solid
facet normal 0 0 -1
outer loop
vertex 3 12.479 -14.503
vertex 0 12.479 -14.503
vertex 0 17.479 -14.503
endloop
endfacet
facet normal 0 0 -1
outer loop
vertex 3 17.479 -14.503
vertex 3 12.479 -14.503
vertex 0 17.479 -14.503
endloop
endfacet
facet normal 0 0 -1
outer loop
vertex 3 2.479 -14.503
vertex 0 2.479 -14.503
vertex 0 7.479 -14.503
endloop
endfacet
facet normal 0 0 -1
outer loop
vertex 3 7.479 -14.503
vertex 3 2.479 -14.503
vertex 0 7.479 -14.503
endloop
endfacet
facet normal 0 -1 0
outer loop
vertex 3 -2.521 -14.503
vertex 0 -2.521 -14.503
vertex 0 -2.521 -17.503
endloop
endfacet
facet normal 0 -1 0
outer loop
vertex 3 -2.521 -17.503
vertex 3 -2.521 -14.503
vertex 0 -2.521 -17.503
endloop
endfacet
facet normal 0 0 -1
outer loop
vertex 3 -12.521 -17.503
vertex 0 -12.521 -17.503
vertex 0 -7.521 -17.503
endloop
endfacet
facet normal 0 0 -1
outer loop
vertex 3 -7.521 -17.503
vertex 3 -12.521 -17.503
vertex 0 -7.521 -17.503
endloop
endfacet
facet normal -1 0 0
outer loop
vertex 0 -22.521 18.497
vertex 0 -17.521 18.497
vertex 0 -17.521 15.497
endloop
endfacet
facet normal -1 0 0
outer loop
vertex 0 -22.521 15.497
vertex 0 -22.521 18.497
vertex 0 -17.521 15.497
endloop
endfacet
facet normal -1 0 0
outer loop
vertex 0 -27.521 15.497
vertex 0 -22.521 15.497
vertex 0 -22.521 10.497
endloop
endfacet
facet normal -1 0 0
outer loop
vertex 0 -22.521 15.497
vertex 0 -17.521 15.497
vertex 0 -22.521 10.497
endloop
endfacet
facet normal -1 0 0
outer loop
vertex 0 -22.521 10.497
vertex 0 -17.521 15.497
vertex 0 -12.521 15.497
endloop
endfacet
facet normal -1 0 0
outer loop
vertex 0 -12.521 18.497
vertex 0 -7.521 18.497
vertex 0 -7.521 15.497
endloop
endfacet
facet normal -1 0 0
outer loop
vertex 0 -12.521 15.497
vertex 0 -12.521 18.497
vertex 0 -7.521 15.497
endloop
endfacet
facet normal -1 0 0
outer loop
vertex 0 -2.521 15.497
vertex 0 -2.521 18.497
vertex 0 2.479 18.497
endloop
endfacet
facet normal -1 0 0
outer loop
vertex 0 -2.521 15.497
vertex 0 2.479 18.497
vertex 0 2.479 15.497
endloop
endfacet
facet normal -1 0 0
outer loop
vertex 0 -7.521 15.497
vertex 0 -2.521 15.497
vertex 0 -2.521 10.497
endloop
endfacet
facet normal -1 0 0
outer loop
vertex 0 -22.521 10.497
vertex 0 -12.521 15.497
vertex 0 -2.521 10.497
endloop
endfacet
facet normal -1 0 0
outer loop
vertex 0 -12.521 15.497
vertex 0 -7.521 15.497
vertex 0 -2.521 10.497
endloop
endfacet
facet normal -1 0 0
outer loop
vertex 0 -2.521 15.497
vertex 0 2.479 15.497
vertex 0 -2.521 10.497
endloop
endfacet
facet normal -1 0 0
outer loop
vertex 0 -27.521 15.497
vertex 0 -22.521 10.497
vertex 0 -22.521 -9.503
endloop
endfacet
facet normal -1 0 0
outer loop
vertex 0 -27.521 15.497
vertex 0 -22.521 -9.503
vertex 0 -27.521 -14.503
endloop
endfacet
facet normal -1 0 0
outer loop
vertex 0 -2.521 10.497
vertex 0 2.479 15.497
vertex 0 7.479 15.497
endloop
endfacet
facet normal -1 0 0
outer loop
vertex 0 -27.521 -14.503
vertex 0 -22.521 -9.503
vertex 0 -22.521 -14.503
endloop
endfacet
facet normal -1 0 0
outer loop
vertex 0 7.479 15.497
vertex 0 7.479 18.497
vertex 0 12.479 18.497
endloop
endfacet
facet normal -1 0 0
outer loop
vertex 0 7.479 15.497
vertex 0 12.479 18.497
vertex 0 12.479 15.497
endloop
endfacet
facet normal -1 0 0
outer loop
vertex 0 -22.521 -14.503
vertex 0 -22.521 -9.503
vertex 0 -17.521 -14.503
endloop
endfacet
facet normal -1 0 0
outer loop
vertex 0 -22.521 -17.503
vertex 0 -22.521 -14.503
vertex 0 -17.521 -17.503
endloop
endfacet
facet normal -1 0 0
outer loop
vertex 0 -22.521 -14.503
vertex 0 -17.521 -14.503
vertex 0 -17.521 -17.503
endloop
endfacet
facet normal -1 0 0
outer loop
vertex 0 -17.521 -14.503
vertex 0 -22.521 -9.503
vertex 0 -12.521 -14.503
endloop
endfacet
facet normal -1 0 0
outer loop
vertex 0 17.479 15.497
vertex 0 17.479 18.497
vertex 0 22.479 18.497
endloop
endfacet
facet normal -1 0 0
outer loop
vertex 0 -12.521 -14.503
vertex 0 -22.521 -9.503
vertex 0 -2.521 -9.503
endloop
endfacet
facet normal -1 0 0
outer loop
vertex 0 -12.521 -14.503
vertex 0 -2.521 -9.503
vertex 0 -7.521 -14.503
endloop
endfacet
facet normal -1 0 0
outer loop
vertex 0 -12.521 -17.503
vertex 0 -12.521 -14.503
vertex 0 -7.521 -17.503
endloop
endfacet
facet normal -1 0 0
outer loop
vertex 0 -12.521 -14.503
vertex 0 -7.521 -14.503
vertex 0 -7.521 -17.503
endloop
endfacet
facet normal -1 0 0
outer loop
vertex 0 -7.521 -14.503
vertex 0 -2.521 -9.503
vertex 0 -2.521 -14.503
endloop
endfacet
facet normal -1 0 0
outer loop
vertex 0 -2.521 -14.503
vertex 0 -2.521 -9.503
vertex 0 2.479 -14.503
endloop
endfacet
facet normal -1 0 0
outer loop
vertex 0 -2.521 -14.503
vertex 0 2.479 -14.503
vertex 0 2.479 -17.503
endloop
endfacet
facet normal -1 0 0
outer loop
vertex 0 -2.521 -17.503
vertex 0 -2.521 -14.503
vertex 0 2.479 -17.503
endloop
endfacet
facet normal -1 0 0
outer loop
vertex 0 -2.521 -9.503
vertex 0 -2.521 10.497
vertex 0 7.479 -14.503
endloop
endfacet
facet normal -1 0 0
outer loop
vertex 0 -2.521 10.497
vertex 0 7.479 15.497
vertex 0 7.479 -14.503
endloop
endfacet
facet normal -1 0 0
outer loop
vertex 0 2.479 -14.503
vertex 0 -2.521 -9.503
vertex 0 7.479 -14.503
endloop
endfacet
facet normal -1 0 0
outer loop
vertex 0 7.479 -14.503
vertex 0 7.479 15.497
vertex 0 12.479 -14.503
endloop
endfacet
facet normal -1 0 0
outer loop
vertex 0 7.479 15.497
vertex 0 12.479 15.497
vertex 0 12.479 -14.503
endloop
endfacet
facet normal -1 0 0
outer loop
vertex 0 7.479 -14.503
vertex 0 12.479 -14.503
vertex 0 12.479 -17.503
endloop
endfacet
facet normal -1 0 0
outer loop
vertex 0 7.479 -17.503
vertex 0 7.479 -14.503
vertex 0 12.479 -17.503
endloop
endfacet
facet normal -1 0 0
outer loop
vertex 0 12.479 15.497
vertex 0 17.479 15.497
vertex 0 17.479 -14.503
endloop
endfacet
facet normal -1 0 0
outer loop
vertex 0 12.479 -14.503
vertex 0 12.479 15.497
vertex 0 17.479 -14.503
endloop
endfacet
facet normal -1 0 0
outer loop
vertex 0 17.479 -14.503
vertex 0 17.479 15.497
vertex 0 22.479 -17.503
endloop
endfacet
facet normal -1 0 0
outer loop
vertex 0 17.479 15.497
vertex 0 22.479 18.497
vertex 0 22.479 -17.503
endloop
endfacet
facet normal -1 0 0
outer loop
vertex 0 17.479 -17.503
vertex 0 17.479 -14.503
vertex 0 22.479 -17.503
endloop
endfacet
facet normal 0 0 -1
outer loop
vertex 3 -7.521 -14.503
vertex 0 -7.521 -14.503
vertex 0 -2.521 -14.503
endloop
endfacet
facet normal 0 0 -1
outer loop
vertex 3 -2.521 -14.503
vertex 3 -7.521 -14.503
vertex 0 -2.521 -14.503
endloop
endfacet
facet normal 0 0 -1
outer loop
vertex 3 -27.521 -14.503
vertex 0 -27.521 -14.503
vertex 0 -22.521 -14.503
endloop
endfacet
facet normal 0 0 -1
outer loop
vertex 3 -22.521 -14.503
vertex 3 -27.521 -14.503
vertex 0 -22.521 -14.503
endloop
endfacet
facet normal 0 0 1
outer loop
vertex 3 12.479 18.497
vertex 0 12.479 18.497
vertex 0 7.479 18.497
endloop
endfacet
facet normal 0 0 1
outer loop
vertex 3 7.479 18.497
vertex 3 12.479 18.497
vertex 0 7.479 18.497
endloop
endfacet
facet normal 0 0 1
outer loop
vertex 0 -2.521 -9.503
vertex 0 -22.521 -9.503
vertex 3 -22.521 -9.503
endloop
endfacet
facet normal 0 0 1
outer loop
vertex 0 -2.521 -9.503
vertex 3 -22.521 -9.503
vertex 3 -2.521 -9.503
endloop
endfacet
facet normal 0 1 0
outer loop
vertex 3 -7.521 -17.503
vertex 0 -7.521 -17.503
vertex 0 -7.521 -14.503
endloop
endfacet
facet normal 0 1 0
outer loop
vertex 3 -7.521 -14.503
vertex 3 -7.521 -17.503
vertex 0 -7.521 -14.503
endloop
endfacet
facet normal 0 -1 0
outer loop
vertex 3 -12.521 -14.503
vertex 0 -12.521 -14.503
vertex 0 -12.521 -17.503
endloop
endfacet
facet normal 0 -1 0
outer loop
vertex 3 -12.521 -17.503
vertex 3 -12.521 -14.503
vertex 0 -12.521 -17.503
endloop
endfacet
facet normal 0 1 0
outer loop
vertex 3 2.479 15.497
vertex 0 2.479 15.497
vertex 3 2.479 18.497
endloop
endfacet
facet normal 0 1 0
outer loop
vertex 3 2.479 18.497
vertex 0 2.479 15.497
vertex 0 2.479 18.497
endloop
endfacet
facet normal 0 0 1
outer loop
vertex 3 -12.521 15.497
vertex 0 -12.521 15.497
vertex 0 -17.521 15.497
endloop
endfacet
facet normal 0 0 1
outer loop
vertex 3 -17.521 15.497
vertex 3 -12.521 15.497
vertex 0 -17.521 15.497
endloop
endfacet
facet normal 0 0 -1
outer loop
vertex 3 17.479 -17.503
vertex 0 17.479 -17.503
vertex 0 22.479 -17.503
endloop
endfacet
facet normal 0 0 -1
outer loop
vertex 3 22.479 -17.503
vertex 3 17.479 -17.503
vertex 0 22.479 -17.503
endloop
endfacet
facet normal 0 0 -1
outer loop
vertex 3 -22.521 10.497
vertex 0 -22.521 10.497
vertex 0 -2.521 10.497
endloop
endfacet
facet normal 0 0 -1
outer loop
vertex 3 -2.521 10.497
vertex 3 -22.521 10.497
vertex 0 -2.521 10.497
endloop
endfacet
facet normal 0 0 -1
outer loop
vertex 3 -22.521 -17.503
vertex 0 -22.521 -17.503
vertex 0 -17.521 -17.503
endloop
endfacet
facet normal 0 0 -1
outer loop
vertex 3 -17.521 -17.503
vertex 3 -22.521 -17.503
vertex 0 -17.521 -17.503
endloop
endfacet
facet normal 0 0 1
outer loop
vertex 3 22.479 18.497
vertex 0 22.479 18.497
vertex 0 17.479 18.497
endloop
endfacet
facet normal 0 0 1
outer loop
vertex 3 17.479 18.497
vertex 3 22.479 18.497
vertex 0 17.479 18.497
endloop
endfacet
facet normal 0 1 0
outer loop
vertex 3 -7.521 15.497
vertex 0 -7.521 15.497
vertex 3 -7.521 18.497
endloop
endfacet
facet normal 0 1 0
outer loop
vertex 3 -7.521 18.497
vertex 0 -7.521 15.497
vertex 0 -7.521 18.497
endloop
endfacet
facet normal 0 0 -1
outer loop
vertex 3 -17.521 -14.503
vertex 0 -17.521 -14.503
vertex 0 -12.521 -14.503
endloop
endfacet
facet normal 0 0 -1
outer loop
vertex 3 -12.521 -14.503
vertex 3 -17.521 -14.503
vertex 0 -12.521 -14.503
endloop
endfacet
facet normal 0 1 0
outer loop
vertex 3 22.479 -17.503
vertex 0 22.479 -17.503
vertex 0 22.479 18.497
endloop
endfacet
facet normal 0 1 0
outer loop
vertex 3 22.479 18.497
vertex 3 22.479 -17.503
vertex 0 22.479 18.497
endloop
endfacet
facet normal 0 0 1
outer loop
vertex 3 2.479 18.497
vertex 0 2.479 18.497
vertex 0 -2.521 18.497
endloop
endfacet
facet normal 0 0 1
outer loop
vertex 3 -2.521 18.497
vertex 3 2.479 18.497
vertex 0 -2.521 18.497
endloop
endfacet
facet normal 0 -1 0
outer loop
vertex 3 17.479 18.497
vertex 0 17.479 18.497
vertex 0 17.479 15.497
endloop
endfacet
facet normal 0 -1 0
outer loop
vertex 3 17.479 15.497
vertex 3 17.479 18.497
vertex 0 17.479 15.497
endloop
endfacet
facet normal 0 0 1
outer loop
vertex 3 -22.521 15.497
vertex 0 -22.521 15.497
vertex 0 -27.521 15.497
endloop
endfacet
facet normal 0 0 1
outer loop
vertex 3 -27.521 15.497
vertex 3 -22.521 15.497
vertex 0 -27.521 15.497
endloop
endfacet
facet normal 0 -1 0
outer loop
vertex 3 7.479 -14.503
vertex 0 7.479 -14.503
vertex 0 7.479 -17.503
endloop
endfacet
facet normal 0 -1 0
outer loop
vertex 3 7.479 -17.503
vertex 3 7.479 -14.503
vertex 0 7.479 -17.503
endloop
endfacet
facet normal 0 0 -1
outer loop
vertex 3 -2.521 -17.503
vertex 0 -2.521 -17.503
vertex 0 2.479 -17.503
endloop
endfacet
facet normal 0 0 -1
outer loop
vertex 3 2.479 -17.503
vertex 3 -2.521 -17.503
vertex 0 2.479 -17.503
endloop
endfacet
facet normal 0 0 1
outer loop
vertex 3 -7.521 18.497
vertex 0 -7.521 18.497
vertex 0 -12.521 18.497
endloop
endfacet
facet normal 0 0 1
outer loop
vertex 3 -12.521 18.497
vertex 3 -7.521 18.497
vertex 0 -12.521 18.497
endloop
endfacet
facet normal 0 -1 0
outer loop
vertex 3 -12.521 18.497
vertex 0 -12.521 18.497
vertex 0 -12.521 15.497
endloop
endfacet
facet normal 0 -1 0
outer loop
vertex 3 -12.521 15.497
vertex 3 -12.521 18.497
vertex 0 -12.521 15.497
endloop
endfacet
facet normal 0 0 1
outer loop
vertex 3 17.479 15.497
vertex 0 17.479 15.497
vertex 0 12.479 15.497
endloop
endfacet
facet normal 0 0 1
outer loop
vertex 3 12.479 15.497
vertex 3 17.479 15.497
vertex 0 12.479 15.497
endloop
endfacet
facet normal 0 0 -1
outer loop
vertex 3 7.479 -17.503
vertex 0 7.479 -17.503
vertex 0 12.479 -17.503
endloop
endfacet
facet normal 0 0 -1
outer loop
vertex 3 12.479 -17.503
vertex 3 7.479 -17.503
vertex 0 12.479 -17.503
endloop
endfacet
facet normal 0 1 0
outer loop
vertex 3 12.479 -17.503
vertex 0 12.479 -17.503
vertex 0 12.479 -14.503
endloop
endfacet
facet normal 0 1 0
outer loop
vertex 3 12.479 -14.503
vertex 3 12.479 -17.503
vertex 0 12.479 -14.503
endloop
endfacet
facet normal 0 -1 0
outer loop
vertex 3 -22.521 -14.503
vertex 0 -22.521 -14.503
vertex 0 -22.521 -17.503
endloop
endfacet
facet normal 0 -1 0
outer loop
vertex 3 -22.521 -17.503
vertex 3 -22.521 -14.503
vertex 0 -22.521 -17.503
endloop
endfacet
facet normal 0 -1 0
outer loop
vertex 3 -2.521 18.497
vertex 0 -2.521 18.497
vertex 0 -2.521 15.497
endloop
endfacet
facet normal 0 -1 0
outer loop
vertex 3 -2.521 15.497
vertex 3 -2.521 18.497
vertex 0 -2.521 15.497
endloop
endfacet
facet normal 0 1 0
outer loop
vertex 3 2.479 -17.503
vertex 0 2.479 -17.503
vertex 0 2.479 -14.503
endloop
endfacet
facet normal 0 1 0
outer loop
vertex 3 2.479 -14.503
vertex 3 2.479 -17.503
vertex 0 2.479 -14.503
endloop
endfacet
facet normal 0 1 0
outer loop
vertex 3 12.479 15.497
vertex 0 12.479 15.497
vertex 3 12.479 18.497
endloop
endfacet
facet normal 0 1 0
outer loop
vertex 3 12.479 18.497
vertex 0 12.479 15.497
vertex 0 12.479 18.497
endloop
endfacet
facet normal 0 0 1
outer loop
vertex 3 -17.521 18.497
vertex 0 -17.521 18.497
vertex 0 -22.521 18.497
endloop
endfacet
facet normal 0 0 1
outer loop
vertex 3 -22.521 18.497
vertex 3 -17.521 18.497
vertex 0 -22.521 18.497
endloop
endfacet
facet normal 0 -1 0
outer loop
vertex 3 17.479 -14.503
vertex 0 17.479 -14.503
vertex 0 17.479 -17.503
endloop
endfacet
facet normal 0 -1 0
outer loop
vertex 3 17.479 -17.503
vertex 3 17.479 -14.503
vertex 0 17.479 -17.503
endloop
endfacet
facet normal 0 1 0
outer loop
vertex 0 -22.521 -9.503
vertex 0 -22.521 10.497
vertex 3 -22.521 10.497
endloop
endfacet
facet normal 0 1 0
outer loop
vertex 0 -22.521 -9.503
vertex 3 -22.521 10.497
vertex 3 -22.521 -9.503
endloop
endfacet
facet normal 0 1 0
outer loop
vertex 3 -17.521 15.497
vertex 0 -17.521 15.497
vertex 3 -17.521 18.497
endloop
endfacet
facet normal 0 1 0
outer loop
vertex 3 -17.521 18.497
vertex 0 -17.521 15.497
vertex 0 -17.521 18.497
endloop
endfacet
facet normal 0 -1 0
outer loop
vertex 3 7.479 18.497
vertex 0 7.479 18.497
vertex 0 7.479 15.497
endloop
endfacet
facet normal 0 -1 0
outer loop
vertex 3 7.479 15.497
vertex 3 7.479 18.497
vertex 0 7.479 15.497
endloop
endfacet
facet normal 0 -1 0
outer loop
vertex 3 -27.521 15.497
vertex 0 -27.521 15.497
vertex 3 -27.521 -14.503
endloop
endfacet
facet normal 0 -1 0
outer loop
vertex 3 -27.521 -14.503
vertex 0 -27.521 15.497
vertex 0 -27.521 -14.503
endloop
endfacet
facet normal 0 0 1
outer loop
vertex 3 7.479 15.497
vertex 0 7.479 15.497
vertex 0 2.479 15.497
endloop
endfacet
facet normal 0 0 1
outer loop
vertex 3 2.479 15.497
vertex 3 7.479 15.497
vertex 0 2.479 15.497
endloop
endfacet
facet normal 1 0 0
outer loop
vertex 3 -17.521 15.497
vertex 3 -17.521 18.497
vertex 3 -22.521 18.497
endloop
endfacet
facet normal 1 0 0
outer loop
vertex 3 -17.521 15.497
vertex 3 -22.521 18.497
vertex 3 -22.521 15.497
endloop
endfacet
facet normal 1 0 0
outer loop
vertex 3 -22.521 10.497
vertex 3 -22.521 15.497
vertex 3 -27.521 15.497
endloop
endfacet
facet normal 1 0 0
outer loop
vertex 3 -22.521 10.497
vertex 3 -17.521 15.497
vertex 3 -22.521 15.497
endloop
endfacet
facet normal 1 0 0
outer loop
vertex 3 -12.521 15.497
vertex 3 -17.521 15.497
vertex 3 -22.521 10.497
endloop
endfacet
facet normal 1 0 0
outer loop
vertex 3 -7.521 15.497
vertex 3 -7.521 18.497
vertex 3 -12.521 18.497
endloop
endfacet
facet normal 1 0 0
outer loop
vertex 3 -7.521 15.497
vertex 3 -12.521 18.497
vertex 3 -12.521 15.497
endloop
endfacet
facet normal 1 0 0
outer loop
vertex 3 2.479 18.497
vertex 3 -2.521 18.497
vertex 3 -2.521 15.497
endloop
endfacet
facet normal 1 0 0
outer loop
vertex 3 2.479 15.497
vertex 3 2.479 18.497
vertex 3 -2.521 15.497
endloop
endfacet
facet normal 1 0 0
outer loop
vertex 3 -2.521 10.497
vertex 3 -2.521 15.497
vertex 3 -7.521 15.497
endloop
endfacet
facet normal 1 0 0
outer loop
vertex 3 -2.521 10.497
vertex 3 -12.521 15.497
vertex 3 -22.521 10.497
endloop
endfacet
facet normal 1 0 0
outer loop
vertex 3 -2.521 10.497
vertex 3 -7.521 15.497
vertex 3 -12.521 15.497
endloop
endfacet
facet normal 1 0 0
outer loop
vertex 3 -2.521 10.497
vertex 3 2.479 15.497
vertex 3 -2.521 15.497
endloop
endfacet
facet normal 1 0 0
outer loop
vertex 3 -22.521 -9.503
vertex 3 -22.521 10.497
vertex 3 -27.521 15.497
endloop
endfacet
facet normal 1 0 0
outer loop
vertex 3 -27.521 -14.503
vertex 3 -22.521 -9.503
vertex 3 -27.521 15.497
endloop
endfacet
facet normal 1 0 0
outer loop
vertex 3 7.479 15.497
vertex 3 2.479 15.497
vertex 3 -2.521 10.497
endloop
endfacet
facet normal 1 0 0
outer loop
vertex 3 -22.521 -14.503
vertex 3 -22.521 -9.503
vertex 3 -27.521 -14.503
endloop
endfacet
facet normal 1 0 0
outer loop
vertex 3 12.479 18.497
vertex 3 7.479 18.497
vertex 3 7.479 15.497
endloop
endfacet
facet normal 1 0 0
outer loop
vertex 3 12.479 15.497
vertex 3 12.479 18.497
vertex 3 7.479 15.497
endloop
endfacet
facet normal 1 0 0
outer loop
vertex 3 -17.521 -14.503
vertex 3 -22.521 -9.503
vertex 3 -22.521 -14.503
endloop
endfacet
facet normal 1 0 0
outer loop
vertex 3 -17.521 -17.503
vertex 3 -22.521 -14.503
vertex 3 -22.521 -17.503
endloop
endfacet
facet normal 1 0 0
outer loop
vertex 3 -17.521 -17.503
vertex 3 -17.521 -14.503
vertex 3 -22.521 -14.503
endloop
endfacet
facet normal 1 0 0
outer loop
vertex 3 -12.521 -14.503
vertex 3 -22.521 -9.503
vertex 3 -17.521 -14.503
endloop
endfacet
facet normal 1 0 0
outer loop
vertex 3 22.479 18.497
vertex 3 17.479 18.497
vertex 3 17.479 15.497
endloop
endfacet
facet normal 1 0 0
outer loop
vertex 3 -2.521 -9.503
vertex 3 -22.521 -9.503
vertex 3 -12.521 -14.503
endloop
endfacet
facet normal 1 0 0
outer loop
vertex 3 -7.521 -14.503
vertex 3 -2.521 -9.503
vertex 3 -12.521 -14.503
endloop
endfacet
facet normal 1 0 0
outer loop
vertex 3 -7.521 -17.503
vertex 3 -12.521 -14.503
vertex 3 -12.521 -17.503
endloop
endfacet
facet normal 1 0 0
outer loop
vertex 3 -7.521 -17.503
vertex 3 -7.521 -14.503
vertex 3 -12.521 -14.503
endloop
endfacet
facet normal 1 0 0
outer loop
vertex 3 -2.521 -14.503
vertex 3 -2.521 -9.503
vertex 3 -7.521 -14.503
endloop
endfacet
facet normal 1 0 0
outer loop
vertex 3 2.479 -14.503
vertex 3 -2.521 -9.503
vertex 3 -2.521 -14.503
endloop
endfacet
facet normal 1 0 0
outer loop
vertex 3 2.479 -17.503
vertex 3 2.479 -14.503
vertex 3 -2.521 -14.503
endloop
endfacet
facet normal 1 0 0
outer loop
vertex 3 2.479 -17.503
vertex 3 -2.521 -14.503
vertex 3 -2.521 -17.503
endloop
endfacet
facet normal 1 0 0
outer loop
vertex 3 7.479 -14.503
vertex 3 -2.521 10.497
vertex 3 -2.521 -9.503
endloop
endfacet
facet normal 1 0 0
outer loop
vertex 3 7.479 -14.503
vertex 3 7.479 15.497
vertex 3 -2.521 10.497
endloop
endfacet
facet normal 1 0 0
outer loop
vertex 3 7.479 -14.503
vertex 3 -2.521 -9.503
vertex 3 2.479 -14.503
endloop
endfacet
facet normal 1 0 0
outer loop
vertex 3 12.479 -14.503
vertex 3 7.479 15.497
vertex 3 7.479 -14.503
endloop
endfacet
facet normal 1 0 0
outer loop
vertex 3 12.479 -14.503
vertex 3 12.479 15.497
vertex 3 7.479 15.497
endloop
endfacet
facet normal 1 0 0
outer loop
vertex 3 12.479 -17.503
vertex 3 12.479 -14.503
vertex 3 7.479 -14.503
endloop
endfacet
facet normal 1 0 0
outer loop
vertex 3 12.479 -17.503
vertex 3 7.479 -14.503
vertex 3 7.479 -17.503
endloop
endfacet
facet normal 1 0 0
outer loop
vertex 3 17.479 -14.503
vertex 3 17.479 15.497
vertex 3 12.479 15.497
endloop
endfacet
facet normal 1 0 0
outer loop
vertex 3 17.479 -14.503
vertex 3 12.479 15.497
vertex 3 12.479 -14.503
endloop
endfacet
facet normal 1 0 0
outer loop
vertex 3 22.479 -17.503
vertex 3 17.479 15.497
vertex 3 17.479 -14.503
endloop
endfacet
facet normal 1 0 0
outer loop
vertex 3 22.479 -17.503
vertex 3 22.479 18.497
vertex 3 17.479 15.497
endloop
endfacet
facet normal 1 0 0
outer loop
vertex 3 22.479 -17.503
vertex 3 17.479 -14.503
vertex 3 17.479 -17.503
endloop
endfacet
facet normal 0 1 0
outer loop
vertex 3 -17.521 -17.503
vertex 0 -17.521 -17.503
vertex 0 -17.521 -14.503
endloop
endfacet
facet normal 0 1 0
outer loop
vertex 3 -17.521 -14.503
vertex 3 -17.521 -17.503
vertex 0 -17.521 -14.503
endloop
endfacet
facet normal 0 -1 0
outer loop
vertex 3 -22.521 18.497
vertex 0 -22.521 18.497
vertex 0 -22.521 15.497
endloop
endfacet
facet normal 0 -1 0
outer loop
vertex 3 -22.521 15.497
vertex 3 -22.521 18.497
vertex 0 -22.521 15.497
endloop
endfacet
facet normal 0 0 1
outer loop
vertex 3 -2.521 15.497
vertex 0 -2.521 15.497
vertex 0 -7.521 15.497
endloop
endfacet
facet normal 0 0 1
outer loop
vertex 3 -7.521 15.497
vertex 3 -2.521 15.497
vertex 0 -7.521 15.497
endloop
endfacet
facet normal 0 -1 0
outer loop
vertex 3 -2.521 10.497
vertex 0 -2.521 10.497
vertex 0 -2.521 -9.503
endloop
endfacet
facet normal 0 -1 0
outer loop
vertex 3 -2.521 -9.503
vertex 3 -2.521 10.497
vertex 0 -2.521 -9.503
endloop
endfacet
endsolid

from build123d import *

# Parameters (mm, degrees)
ESBO_O1_W                = 20
ESBO_O1_H                = 20
RESSALTO_EXTRUS_O1_DEPTH = 3


with BuildPart() as part:
    # Esboço1 → Ressalto-extrusão1 (new body)
    with BuildSketch(Plane(origin=(0, 0, 0), x_dir=(0, 0, -1), z_dir=(1, 0, 0))):
        Polygon((-18.496900578, 22.479218088), (-18.496900578, 17.479218088), (-15.496900578, 17.479218088), (-15.496900578, 12.479218088), (-18.496900578, 12.479218088), (-18.496900578, 7.479218088), (-15.496900578, 7.479218088), (-15.496900578, 2.479218088), (-18.496900578, 2.479218088), (-18.496900578, -2.520781912), (-15.496900578, -2.520781912), (-15.496900578, -7.520781912), (-18.496900578, -7.520781912), (-18.496900578, -12.520781912), (-15.496900578, -12.520781912), (-15.496900578, -17.520781912), (-18.496900578, -17.520781912), (-18.496900578, -22.520781912), (-15.496900578, -22.520781912), (-15.496900578, -27.520781912), (14.503099422, -27.520781912), (14.503099422, -22.520781912), (17.503099422, -22.520781912), (17.503099422, -17.520781912), (14.503099422, -17.520781912), (14.503099422, -12.520781912), (17.503099422, -12.520781912), (17.503099422, -7.520781912), (14.503099422, -7.520781912), (14.503099422, -2.520781912), (17.503099422, -2.520781912), (17.503099422, 2.479218088), (14.503099422, 2.479218088), (14.503099422, 7.479218088), (17.503099422, 7.479218088), (17.503099422, 12.479218088), (14.503099422, 12.479218088), (14.503099422, 17.479218088), (17.503099422, 17.479218088), (17.503099422, 22.479218088), align=None)
        with Locations((-0.496900578, -12.520781912)):
            Rectangle(ESBO_O1_W, ESBO_O1_H, mode=Mode.SUBTRACT)
    extrude(amount=RESSALTO_EXTRUS_O1_DEPTH)


solid = part.part
